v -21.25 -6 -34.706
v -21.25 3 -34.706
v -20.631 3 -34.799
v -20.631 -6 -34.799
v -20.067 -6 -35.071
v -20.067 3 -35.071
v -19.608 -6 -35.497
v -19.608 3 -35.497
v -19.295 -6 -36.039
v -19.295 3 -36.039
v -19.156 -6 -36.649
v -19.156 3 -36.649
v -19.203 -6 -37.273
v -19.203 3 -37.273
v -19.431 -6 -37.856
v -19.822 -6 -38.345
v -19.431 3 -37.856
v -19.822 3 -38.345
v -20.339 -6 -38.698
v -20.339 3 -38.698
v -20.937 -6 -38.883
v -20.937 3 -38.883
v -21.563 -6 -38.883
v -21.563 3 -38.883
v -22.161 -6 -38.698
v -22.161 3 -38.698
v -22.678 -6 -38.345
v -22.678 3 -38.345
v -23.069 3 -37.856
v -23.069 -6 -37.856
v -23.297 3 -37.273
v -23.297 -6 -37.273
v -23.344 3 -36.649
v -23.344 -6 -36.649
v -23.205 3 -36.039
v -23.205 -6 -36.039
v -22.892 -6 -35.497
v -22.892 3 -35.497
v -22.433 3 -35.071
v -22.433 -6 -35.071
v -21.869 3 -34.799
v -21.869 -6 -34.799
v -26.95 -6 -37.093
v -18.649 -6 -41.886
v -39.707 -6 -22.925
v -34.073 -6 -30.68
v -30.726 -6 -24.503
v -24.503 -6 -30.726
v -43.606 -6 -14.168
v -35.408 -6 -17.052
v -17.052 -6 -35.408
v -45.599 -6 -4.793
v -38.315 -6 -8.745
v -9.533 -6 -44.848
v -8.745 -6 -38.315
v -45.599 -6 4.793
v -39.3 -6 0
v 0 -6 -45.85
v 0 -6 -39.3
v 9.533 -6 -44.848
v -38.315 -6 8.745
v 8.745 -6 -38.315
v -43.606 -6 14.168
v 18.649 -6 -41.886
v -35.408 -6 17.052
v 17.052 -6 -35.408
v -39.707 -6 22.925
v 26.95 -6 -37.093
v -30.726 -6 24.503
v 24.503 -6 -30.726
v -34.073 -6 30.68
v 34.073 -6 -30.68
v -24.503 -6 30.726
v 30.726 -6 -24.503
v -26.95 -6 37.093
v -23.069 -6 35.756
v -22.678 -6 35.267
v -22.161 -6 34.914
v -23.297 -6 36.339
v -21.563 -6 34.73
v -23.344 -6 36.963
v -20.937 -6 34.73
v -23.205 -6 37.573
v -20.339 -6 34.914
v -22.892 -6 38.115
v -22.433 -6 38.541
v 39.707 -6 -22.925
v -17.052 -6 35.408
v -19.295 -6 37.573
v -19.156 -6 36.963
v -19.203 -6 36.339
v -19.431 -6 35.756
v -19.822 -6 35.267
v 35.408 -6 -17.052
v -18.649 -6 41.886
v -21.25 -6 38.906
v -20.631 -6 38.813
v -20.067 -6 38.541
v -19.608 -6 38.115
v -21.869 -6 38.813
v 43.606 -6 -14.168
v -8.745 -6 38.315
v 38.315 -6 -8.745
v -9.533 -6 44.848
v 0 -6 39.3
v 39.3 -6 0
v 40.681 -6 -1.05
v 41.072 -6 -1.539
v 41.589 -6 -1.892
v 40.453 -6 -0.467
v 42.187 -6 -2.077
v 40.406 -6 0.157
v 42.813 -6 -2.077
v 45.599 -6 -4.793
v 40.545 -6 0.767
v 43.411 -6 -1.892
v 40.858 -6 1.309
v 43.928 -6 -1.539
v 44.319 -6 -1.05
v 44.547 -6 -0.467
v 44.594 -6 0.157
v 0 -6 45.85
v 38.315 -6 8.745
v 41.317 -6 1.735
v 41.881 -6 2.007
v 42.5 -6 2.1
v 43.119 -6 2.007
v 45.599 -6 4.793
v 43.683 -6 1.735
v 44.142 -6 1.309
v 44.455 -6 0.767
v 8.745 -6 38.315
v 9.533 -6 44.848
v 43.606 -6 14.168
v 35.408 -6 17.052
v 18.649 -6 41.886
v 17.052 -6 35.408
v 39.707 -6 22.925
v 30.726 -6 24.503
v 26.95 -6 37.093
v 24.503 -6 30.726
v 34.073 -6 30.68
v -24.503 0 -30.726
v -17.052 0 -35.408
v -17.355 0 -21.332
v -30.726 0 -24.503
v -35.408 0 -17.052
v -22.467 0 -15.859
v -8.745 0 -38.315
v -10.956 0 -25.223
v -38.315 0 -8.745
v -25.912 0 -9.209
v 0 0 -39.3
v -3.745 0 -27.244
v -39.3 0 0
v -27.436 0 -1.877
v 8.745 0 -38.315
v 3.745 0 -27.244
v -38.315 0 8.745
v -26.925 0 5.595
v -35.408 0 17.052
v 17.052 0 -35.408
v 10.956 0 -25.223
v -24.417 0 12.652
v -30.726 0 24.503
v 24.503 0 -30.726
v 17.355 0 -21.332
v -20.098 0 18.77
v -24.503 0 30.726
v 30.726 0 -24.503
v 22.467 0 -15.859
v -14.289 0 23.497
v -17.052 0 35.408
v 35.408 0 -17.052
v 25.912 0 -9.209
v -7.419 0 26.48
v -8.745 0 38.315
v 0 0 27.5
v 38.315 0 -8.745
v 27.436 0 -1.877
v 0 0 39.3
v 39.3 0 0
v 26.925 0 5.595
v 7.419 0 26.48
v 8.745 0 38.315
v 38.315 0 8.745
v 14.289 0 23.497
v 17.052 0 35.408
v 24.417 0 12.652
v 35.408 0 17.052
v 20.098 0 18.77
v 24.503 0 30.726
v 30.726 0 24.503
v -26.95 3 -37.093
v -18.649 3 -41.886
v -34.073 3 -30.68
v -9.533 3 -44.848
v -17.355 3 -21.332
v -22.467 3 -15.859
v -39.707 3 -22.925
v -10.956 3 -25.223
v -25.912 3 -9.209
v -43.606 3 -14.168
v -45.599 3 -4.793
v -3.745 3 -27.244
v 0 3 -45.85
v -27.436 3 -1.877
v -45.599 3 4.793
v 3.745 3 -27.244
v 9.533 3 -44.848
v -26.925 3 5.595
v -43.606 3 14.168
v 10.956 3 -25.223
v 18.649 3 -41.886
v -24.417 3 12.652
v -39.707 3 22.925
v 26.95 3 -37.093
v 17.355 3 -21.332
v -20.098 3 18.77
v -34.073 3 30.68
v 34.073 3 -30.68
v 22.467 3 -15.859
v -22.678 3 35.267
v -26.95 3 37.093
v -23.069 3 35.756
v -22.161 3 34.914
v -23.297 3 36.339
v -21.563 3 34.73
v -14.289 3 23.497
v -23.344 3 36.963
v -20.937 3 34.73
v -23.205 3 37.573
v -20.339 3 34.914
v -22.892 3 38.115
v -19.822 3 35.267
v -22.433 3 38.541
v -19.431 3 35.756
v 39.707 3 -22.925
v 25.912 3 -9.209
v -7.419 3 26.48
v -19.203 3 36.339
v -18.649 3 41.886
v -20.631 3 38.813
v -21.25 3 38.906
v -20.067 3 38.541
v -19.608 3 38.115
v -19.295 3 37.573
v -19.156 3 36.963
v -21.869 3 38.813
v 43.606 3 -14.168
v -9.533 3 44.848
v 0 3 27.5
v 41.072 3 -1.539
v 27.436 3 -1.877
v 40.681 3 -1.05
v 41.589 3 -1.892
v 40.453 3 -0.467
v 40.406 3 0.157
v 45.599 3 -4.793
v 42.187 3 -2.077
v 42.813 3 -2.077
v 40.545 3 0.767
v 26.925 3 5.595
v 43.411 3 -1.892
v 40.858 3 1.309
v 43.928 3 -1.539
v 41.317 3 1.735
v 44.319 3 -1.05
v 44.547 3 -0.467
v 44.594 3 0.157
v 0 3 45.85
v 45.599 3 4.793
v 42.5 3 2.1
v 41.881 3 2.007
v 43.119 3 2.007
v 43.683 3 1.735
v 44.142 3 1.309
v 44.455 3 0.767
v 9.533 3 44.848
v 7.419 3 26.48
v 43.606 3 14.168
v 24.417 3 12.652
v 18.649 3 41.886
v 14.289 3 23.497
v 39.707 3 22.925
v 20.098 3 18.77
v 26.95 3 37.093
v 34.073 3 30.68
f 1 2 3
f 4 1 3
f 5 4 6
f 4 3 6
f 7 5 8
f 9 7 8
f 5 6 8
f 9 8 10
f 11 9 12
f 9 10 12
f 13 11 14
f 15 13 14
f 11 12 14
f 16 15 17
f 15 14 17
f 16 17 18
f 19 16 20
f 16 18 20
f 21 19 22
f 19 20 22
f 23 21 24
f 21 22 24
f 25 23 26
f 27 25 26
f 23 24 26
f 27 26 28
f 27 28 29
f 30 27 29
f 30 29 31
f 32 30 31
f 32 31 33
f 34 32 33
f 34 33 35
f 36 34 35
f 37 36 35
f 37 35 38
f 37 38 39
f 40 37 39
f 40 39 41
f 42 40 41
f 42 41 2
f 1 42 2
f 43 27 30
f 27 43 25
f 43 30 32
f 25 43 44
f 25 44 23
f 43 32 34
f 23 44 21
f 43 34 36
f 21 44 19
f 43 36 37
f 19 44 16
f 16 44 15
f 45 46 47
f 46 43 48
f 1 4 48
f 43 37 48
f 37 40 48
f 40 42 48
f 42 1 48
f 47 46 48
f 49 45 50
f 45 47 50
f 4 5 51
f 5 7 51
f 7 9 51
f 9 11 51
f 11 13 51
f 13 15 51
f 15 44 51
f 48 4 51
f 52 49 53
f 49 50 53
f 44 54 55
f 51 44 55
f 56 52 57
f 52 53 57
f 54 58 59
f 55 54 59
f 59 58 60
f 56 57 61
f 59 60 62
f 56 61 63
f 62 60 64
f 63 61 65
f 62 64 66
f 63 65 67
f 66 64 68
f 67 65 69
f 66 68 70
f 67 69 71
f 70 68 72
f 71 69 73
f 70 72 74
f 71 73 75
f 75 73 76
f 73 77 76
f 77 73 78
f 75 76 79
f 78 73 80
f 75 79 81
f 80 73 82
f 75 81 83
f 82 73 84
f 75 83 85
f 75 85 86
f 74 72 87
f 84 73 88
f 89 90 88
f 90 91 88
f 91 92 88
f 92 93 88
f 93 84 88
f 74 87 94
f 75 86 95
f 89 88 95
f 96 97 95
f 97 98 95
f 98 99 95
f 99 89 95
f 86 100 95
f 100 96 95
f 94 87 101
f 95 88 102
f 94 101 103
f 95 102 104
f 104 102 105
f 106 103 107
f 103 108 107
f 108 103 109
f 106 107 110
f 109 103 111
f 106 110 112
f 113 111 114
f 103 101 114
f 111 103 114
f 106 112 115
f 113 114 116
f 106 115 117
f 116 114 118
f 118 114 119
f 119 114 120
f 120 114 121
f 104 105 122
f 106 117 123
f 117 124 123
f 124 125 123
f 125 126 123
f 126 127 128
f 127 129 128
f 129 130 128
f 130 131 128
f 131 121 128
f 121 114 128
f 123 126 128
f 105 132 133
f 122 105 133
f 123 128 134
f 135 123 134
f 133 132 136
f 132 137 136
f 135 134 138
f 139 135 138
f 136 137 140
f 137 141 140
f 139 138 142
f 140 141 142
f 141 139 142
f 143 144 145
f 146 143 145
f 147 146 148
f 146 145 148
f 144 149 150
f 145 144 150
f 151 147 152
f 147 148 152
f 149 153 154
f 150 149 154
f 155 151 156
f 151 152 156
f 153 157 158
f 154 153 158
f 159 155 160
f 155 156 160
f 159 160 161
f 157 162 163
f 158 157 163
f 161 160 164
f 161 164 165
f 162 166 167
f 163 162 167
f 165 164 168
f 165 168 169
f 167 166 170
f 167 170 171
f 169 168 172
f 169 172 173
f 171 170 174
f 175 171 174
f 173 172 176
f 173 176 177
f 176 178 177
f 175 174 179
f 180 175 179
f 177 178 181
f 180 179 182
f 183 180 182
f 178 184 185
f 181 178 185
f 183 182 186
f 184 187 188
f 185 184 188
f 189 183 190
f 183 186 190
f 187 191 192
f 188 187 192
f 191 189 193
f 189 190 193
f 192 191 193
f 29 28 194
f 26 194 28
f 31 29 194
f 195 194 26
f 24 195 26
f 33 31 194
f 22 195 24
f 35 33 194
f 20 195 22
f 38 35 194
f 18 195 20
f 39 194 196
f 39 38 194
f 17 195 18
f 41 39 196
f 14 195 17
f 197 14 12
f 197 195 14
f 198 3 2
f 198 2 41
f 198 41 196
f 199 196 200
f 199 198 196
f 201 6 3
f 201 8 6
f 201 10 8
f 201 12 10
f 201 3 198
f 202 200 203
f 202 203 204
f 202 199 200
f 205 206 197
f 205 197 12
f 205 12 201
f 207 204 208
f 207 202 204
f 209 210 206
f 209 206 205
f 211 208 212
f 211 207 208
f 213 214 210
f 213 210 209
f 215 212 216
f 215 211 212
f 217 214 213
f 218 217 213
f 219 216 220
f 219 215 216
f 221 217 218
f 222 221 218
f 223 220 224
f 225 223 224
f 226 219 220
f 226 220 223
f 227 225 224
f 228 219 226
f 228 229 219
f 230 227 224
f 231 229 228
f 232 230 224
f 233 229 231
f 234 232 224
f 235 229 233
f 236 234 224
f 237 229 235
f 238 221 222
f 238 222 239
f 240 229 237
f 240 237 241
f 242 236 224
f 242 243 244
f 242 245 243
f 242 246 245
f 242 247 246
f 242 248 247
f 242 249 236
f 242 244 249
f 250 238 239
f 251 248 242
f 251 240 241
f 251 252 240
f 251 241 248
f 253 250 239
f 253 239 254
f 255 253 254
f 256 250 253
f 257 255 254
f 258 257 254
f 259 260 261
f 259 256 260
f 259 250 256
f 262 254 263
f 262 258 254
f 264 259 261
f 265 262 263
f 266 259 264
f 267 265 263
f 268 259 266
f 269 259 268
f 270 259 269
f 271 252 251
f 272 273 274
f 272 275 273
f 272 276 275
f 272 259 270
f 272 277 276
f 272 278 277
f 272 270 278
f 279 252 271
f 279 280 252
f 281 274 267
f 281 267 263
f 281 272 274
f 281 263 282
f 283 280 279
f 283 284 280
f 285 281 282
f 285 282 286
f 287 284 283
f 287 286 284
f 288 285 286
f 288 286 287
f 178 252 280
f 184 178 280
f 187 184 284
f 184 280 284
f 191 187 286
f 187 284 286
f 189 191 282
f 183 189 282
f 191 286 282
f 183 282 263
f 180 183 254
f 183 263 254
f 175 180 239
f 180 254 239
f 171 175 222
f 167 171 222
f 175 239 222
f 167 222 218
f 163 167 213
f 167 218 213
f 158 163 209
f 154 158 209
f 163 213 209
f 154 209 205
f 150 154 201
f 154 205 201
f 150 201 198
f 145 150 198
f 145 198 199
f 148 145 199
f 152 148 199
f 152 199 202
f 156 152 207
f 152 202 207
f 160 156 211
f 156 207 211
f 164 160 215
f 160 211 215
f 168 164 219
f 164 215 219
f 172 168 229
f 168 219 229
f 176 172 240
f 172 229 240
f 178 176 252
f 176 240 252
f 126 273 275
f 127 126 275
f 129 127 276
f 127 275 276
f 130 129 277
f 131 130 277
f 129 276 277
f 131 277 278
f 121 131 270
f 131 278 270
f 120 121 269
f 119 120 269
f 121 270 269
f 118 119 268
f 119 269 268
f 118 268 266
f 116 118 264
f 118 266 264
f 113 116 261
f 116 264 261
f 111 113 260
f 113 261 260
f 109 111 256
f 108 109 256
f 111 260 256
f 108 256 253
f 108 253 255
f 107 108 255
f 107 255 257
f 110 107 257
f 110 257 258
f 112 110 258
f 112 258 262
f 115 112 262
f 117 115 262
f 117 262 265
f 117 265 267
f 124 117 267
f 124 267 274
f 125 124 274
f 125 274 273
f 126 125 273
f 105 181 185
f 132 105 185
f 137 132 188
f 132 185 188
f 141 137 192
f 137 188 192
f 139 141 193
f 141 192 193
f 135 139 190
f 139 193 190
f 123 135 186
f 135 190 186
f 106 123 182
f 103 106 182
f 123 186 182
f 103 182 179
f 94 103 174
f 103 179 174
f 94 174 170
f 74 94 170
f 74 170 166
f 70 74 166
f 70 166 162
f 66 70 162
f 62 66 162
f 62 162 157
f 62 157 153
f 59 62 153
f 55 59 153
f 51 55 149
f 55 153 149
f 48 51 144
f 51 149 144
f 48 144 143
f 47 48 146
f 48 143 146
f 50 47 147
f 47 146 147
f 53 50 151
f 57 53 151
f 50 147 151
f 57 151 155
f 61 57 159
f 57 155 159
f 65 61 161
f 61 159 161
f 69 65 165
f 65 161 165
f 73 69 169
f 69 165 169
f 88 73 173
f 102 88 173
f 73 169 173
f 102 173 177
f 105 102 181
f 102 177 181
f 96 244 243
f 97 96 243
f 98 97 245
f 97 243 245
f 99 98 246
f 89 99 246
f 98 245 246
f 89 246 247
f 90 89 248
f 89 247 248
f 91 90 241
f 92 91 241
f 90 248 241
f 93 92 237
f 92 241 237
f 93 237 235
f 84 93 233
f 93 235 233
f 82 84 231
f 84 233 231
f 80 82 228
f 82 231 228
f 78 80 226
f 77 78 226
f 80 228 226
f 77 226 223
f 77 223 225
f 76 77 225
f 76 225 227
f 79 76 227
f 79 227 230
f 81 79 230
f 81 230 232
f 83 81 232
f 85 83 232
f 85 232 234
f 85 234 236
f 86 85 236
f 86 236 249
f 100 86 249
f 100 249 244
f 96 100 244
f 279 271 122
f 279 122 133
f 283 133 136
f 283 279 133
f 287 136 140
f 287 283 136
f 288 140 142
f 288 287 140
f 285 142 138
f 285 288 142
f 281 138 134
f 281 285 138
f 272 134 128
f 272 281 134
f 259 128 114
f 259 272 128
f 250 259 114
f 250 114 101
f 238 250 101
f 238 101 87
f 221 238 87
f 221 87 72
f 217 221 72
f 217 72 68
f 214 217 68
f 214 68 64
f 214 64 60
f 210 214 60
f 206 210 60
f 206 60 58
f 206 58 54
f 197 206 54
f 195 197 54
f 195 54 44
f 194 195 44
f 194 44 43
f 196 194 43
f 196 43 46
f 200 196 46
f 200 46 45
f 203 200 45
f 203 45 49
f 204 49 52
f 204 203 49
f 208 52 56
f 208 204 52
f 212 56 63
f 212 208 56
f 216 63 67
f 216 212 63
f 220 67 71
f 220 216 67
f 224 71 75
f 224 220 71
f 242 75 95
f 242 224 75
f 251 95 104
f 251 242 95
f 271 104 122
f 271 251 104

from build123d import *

# Parameters (mm, degrees)
SKETCH1_R           = 45.85
SKETCH1_R_2         = 2.1
SKETCH1_R_3         = 39.3
BOSS_EXTRUDE1_DEPTH = 6
BOSS_EXTRUDE2_START = 3
SKETCH1_4_R         = 45.85
SKETCH1_4_R_2       = 2.1
SKETCH1_4_R_3       = 27.5
BOSS_EXTRUDE2_DEPTH = 3


with BuildPart() as part:
    # Sketch1 → Boss-Extrude1 (new body)
    with BuildSketch(Plane(origin=(0, 0, 0), x_dir=(1, 0, 0), z_dir=(0, 1, 0))):
        Circle(SKETCH1_R)
        with Locations((-21.25, -36.806079661)):
            Circle(SKETCH1_R_2, mode=Mode.SUBTRACT)
        with Locations((-21.25, 36.806079661)):
            Circle(SKETCH1_R_2, mode=Mode.SUBTRACT)
        Circle(SKETCH1_R_3, mode=Mode.SUBTRACT)
        with Locations((42.5, 0)):
            Circle(SKETCH1_R_2, mode=Mode.SUBTRACT)
    extrude(amount=-BOSS_EXTRUDE1_DEPTH)

    # Sketch1<4> → Boss-Extrude2 (add)
    with BuildSketch(Plane(origin=(0, 0, 0), x_dir=(1, 0, 0), z_dir=(0, 1, 0)).offset(BOSS_EXTRUDE2_START)):
        Circle(SKETCH1_4_R)
        with Locations((-21.25, -36.806079661)):
            Circle(SKETCH1_4_R_2, mode=Mode.SUBTRACT)
        with Locations((-21.25, 36.806079661)):
            Circle(SKETCH1_4_R_2, mode=Mode.SUBTRACT)
        with Locations((42.5, 0)):
            Circle(SKETCH1_4_R_2, mode=Mode.SUBTRACT)
        Circle(SKETCH1_4_R_3, mode=Mode.SUBTRACT)
    extrude(amount=-BOSS_EXTRUDE2_DEPTH)


solid = part.part
